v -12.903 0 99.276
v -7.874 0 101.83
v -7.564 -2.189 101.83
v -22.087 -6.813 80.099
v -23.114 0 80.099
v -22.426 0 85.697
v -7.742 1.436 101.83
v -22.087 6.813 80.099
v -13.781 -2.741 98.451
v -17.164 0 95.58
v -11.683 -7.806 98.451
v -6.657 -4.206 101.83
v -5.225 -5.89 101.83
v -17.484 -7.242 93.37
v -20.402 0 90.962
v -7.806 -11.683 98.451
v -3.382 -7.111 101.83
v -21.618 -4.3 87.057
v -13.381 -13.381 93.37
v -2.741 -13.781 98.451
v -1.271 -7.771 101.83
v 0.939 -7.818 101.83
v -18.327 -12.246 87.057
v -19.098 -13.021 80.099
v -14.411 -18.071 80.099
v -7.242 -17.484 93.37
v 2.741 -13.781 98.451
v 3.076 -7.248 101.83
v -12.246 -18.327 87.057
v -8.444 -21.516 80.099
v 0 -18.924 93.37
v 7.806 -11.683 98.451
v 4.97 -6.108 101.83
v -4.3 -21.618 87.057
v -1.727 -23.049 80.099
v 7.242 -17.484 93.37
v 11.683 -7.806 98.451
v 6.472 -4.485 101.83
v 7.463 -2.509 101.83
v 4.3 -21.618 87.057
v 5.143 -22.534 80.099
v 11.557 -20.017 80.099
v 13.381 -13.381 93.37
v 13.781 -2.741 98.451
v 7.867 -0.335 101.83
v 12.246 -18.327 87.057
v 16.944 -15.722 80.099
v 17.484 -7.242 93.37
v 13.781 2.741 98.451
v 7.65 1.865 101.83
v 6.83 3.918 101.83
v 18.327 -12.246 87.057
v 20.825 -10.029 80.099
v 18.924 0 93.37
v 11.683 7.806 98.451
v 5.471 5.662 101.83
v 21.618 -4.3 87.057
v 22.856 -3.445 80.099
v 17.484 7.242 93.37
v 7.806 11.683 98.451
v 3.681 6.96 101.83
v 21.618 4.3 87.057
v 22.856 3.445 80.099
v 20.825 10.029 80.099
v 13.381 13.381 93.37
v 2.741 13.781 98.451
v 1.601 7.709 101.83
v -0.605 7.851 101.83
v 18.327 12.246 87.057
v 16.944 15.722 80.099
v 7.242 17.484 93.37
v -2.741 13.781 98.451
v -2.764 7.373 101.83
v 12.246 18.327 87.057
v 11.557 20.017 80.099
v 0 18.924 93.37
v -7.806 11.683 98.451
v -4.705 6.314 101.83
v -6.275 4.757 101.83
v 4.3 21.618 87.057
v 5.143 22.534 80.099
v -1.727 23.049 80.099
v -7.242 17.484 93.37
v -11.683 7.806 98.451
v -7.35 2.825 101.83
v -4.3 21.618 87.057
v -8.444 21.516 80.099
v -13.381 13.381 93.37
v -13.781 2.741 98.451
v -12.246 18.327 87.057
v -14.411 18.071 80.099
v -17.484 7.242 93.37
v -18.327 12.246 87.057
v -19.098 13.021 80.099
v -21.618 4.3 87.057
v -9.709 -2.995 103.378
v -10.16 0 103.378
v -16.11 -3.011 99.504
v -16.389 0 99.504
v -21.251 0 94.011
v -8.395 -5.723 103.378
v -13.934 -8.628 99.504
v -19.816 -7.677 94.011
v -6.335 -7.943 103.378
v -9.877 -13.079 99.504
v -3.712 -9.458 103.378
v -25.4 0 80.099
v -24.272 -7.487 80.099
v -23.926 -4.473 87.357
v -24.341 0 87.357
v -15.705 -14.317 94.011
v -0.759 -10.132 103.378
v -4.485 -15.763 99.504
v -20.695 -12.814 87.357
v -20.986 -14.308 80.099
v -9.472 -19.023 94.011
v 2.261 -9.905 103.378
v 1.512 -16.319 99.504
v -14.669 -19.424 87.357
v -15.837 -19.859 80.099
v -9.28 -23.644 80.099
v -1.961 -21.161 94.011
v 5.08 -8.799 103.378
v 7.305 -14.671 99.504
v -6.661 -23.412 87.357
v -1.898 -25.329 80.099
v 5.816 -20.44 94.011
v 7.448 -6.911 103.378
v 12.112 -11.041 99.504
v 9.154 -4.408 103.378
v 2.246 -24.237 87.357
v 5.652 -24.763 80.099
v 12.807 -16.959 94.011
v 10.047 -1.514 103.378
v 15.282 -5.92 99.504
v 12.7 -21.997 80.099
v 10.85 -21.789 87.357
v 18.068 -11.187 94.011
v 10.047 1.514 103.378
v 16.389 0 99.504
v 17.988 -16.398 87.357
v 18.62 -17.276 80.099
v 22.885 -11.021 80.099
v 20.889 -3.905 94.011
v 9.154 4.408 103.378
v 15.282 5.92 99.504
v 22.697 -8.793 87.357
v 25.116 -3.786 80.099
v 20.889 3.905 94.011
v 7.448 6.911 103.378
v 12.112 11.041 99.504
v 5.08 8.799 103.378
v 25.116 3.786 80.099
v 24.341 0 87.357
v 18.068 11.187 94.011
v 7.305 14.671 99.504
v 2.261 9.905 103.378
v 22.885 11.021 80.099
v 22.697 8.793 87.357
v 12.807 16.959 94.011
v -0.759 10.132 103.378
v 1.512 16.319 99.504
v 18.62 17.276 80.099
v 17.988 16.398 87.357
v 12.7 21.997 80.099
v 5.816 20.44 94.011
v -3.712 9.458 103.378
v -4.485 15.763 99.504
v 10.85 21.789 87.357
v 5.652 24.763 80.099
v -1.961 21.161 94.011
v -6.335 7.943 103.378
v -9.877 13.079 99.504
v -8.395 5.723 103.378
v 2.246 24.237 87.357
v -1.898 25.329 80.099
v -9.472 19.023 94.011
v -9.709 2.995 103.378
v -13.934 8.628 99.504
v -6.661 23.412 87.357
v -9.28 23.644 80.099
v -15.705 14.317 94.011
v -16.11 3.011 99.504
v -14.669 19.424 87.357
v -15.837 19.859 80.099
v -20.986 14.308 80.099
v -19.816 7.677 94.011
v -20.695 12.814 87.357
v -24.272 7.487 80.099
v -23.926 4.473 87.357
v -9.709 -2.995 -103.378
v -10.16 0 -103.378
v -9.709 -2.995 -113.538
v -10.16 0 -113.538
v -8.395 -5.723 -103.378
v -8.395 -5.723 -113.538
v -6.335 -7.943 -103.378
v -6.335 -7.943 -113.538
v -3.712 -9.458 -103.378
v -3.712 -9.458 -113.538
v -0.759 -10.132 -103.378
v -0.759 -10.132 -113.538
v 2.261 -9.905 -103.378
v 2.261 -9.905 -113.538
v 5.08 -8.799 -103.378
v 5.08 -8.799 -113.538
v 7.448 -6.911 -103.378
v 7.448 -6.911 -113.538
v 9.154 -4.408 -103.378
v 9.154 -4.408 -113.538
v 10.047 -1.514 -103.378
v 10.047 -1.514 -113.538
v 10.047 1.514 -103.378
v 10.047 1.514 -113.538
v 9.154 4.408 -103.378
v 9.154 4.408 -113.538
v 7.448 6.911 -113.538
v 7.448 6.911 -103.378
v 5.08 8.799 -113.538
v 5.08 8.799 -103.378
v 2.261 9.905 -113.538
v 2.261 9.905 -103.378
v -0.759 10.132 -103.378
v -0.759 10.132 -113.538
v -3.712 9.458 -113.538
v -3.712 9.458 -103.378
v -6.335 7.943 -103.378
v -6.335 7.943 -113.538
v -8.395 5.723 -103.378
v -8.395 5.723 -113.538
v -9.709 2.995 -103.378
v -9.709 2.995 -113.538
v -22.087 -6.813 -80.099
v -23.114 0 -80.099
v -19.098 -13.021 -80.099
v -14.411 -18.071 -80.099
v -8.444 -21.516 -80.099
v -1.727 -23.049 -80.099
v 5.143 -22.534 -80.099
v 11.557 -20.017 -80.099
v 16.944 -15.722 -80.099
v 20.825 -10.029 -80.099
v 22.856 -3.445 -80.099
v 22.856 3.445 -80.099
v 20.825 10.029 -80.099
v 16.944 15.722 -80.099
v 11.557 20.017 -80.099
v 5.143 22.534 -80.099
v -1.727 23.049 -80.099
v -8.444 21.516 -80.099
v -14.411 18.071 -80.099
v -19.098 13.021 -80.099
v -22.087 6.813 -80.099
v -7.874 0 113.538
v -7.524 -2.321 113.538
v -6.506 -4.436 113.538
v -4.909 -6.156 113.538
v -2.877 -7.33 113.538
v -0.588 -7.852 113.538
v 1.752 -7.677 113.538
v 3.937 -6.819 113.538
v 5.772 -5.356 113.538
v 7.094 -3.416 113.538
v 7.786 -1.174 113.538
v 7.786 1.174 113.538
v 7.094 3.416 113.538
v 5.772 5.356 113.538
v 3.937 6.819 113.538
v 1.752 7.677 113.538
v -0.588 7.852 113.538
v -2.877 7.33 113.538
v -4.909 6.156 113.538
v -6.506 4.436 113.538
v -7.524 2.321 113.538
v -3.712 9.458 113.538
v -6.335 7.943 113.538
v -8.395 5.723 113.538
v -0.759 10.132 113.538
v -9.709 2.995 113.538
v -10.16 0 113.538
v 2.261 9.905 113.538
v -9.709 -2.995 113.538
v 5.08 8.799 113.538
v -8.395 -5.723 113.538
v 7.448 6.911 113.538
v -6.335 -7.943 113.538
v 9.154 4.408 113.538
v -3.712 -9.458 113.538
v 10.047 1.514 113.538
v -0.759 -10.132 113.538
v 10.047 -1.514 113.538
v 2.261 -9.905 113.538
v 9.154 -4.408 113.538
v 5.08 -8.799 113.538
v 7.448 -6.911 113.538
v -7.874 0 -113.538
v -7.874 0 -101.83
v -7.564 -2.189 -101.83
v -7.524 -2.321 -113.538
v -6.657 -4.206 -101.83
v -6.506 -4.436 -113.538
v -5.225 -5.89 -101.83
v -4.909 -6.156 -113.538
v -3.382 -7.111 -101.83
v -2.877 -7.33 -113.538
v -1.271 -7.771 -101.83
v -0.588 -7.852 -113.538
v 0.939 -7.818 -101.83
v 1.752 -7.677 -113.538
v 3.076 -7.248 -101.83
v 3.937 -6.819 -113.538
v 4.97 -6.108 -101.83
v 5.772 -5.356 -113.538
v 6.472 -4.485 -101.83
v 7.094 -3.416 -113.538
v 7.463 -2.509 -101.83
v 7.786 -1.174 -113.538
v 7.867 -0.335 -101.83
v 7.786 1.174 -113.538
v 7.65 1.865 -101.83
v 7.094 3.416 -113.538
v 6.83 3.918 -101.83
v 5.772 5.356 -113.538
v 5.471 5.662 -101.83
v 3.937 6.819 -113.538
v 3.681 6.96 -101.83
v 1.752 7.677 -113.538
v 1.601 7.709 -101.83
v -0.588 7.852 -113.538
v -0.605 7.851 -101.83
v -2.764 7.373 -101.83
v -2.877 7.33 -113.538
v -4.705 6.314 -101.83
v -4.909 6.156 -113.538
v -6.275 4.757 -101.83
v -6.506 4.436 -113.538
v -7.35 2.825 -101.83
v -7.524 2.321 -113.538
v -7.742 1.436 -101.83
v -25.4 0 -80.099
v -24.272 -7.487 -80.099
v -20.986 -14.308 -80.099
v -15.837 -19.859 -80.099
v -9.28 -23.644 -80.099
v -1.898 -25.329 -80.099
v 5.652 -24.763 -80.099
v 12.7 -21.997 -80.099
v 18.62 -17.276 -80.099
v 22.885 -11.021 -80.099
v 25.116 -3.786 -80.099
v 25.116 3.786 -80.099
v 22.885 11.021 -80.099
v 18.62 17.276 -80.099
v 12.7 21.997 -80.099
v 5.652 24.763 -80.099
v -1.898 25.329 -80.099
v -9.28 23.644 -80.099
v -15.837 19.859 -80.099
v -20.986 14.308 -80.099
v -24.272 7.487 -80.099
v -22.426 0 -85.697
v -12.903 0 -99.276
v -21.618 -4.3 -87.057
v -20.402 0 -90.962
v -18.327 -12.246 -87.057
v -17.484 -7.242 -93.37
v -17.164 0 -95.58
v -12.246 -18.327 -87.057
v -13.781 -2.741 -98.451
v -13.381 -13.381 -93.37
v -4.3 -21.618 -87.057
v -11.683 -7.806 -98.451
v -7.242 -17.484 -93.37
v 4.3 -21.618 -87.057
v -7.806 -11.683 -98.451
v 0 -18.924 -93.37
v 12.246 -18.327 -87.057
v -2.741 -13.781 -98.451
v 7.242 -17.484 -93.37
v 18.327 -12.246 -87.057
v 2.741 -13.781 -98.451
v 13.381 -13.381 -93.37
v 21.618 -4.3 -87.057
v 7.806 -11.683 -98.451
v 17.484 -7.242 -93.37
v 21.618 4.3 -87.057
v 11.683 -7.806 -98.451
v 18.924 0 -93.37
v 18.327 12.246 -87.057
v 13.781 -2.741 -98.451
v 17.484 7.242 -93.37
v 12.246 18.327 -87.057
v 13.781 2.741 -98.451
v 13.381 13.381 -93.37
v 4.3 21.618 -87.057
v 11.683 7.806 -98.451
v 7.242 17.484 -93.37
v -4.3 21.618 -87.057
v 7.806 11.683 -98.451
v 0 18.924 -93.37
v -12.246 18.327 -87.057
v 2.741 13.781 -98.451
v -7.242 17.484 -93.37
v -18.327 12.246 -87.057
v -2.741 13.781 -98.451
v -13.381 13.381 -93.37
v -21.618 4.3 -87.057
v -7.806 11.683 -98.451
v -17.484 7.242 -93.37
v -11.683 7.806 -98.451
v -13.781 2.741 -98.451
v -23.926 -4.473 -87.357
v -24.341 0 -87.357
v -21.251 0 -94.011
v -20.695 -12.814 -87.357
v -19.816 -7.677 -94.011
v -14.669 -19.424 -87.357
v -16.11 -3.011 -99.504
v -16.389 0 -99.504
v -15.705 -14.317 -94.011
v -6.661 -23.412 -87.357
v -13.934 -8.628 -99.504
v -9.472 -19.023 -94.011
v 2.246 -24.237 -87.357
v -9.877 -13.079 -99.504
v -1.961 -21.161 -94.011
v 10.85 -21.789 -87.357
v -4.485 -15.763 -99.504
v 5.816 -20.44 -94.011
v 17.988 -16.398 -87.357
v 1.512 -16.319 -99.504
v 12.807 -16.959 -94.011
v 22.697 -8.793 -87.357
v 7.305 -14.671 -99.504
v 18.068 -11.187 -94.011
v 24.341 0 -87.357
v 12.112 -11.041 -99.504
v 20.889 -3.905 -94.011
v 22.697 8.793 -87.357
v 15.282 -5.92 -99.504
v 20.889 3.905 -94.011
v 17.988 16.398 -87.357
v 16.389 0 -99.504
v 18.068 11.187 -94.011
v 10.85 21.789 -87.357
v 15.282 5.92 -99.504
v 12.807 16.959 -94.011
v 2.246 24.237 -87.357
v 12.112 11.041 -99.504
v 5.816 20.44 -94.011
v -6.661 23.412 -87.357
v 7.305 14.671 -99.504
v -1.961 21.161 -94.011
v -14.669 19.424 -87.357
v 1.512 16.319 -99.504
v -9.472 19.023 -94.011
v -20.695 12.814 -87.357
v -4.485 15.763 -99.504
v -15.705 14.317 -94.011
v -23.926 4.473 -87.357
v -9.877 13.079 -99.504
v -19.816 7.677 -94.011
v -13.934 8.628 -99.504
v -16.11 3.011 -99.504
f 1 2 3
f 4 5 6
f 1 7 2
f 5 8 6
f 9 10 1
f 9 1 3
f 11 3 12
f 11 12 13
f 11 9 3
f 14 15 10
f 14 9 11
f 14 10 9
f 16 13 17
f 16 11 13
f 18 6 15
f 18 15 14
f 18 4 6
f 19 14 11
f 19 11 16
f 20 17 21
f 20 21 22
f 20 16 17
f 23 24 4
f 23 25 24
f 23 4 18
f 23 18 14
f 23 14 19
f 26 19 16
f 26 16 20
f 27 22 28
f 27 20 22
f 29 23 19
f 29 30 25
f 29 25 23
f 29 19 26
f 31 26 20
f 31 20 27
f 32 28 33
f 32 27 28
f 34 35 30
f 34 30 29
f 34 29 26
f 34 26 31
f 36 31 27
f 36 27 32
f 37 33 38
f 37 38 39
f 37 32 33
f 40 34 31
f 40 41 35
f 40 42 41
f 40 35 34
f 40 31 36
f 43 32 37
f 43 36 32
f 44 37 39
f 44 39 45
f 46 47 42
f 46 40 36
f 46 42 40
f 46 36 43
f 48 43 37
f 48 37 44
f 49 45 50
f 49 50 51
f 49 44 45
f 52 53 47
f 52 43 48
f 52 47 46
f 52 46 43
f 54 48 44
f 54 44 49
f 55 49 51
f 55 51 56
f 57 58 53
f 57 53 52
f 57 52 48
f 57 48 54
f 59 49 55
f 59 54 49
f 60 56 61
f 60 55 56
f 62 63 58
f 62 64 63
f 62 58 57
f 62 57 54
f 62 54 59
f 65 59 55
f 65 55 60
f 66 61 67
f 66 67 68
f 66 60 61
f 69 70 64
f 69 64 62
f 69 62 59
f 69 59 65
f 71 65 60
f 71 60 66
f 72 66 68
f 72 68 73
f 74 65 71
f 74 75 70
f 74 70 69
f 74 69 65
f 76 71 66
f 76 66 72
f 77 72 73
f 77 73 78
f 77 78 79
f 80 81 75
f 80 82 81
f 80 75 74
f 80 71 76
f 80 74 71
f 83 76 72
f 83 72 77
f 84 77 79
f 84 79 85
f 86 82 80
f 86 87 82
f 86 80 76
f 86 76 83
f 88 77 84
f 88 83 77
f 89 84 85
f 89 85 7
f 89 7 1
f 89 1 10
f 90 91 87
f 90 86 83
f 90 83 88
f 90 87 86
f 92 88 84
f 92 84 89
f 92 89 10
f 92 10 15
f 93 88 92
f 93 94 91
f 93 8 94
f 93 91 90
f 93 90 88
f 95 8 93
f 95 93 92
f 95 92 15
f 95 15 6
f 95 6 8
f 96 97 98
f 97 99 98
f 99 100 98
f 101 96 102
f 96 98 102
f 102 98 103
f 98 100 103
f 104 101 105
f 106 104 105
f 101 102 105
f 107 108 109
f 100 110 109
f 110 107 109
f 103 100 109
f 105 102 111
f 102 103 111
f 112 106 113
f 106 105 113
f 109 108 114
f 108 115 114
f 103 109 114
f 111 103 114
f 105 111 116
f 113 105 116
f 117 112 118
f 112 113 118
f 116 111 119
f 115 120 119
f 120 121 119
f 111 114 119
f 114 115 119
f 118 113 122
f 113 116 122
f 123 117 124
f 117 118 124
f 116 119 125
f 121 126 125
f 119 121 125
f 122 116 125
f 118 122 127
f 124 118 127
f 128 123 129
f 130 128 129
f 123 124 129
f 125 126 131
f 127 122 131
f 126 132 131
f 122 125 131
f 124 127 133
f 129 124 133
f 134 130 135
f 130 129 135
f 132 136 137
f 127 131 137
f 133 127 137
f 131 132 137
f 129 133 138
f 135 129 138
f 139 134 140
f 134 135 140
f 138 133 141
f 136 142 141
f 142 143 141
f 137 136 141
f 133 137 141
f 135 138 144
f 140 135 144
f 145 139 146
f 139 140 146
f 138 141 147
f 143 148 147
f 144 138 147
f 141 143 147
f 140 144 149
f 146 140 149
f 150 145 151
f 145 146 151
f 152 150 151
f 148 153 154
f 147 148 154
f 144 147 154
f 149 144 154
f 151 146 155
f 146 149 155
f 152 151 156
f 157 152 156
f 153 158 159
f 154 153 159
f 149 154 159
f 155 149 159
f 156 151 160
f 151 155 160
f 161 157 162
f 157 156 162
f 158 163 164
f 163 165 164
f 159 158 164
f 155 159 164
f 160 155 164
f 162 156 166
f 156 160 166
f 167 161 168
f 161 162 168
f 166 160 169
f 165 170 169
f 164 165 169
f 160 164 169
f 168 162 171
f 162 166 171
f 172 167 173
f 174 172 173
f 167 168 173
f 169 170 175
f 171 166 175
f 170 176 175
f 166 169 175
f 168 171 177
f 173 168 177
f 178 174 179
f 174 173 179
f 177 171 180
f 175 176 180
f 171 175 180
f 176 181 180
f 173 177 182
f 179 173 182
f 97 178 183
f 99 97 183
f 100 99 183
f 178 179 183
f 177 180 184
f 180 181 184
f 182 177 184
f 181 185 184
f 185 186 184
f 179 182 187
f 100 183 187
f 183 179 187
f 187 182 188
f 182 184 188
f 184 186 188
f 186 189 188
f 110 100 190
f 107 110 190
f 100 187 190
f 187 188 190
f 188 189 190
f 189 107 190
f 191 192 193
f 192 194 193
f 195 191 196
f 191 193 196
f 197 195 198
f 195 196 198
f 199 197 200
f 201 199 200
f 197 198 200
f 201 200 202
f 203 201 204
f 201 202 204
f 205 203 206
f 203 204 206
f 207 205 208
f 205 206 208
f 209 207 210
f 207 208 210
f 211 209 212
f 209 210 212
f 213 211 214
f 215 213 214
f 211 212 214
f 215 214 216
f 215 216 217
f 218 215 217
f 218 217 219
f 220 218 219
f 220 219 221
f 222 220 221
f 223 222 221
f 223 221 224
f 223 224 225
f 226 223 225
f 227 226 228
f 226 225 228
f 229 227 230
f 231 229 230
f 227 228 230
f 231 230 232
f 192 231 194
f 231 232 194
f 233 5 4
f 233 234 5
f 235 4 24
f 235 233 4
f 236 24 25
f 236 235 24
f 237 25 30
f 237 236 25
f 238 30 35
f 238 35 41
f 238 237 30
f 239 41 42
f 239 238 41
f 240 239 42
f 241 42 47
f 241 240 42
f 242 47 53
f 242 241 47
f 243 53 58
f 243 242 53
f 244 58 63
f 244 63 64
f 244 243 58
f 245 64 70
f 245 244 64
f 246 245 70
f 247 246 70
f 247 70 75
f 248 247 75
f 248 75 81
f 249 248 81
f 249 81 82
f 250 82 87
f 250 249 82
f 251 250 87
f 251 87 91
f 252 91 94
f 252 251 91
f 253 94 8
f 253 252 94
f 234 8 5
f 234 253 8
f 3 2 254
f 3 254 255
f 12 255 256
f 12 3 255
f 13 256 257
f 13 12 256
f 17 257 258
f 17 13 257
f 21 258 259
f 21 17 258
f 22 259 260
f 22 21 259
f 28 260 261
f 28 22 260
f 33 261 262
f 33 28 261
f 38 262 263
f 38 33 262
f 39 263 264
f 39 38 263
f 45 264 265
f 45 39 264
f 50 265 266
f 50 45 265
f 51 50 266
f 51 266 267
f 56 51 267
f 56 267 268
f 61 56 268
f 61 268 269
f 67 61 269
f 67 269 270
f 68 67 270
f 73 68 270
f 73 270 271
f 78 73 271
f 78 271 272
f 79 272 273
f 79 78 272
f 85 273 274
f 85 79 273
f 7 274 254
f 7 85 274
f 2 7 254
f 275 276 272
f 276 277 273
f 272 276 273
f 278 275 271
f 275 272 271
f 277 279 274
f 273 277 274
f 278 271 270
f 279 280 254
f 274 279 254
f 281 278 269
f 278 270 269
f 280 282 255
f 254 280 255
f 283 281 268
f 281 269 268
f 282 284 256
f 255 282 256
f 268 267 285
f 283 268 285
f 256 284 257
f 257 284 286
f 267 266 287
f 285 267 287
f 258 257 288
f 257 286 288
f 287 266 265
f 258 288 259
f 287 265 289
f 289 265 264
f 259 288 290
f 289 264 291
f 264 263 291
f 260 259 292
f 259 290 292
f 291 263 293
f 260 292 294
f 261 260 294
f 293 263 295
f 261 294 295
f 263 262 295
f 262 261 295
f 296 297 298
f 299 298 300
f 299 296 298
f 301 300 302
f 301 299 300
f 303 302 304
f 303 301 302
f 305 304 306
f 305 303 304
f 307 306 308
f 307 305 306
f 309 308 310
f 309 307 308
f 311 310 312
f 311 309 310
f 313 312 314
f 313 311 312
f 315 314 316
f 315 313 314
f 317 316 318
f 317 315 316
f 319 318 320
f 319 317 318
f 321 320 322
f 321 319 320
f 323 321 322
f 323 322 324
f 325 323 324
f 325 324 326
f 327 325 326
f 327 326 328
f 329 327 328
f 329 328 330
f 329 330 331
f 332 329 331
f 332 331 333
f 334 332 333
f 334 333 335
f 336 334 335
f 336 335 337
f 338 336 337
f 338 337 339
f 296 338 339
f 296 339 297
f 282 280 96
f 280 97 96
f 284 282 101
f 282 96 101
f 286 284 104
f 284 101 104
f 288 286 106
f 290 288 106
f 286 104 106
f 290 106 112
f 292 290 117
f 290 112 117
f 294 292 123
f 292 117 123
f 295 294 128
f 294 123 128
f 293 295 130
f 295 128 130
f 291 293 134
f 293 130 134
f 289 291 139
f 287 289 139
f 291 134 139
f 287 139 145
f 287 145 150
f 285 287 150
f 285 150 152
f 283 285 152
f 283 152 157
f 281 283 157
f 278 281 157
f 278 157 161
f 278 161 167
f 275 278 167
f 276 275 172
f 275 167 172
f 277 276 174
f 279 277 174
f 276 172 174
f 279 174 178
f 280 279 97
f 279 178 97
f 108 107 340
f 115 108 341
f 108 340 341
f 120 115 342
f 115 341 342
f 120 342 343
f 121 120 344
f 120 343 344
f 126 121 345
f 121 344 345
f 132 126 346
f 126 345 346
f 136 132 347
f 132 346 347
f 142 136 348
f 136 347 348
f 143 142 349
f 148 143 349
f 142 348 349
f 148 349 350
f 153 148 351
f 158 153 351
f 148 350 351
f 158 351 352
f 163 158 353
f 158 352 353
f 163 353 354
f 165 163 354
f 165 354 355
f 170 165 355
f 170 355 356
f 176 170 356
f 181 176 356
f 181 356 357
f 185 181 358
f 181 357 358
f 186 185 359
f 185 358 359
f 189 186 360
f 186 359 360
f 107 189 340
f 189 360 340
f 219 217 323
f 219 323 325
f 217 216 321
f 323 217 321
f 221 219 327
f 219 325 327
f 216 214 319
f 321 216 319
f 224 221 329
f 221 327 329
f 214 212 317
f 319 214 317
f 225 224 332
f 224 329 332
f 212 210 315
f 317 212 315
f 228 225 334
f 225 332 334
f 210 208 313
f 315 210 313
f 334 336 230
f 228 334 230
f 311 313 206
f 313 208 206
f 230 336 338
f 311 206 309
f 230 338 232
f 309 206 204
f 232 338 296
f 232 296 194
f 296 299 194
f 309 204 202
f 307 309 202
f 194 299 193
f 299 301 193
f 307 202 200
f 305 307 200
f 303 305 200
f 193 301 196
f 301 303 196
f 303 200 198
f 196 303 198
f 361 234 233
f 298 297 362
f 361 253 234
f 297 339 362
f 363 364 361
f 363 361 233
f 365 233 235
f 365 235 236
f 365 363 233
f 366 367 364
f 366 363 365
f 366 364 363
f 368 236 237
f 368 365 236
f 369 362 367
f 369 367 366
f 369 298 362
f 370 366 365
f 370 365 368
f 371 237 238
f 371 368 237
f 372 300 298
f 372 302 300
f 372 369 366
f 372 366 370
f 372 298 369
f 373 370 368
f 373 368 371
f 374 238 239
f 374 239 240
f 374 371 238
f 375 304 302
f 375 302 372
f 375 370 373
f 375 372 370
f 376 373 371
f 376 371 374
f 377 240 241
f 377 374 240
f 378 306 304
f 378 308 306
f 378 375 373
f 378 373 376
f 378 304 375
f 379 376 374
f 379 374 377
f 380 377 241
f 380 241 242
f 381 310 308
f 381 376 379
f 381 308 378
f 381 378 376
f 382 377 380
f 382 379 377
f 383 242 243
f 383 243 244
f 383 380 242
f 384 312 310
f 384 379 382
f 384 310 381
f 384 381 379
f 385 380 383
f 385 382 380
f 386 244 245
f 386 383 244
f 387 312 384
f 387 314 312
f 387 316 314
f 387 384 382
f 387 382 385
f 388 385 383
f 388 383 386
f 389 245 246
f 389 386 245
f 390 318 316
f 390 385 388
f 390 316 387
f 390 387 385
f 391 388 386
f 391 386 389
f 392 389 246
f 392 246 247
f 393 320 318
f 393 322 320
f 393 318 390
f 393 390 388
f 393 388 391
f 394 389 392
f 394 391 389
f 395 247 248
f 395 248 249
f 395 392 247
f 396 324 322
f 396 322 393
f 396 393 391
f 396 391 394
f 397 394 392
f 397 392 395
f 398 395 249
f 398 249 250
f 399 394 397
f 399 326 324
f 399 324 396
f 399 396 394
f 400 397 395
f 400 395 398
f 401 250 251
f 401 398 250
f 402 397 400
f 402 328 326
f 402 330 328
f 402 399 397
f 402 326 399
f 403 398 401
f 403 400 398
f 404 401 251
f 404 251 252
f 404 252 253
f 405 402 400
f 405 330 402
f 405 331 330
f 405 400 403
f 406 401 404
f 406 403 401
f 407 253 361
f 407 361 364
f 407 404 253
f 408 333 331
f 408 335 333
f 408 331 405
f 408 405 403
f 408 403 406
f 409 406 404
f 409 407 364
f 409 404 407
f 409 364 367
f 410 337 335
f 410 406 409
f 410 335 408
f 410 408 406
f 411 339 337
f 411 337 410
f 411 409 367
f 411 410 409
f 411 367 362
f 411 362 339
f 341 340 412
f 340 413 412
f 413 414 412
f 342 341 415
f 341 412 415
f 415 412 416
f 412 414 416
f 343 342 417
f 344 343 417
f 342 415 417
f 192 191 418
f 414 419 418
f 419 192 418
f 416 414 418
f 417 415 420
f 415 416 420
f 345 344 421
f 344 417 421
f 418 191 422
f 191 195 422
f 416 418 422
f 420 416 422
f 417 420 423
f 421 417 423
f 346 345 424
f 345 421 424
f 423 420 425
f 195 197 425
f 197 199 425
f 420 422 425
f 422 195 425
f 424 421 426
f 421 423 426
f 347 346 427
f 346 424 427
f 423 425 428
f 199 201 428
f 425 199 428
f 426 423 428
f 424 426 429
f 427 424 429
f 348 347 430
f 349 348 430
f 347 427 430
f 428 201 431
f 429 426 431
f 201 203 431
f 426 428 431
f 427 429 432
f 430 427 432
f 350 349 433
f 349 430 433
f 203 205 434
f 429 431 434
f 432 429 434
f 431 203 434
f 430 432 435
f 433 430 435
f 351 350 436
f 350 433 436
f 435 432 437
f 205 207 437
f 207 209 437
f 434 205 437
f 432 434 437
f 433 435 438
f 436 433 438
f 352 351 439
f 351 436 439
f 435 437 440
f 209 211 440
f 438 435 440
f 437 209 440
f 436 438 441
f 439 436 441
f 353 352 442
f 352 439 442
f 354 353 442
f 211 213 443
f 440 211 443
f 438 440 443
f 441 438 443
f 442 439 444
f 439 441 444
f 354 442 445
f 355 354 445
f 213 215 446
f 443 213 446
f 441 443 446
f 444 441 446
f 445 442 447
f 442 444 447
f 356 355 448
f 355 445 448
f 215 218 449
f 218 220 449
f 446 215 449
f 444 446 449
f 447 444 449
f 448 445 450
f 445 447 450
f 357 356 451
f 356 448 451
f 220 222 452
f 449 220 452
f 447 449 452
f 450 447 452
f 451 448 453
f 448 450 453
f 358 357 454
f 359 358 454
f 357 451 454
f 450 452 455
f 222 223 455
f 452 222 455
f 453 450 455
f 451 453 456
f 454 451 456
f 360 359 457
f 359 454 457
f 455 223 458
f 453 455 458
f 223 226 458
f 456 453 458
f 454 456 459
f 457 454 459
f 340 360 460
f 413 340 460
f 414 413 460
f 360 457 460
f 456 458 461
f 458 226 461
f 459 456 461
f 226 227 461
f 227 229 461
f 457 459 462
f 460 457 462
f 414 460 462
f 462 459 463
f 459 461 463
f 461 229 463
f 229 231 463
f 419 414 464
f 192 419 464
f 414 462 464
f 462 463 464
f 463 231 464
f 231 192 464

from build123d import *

# Parameters (mm, degrees)
SHELL1_T = -2.286


with BuildPart() as part:
    # Sketch1 → Revolve1 (revolve)
    with BuildSketch(Plane(origin=(0, 0, 0), x_dir=(0, 0, -1), z_dir=(1, 0, 0)), mode=Mode.PRIVATE) as revolve1_sk:
        with BuildLine():
            Line((113.538, 0), (-113.538, 0))
            Line((-113.538, 0), (-113.538, 10.16))
            Line((-113.538, 10.16), (-103.378, 10.16))
            ThreePointArc((-103.378, 10.16), (-94.01066843, 21.251164674), (-80.09851547, 25.4))
            Line((-80.09851547, 25.4), (80.09851547, 25.4))
            ThreePointArc((80.09851547, 25.4), (94.01066843, 21.251164674), (103.378, 10.16))
            Line((103.378, 10.16), (113.538, 10.16))
            Line((113.538, 10.16), (113.538, 0))
        make_face()
    revolve(revolve1_sk.sketch.rotate(Axis((0, 0, -113.538), (0, 0, 1)), 90), axis=Axis((0, 0, -113.538), (0, 0, 1)))

    # Shell1
    shell1_openings = [part.faces().sort_by_distance(p)[0] for p in [
        (0, 0, 113.538),
        (0, 0, -113.538),
    ]]
    offset(amount=SHELL1_T, openings=shell1_openings, kind=Kind.INTERSECTION)


solid = part.part
